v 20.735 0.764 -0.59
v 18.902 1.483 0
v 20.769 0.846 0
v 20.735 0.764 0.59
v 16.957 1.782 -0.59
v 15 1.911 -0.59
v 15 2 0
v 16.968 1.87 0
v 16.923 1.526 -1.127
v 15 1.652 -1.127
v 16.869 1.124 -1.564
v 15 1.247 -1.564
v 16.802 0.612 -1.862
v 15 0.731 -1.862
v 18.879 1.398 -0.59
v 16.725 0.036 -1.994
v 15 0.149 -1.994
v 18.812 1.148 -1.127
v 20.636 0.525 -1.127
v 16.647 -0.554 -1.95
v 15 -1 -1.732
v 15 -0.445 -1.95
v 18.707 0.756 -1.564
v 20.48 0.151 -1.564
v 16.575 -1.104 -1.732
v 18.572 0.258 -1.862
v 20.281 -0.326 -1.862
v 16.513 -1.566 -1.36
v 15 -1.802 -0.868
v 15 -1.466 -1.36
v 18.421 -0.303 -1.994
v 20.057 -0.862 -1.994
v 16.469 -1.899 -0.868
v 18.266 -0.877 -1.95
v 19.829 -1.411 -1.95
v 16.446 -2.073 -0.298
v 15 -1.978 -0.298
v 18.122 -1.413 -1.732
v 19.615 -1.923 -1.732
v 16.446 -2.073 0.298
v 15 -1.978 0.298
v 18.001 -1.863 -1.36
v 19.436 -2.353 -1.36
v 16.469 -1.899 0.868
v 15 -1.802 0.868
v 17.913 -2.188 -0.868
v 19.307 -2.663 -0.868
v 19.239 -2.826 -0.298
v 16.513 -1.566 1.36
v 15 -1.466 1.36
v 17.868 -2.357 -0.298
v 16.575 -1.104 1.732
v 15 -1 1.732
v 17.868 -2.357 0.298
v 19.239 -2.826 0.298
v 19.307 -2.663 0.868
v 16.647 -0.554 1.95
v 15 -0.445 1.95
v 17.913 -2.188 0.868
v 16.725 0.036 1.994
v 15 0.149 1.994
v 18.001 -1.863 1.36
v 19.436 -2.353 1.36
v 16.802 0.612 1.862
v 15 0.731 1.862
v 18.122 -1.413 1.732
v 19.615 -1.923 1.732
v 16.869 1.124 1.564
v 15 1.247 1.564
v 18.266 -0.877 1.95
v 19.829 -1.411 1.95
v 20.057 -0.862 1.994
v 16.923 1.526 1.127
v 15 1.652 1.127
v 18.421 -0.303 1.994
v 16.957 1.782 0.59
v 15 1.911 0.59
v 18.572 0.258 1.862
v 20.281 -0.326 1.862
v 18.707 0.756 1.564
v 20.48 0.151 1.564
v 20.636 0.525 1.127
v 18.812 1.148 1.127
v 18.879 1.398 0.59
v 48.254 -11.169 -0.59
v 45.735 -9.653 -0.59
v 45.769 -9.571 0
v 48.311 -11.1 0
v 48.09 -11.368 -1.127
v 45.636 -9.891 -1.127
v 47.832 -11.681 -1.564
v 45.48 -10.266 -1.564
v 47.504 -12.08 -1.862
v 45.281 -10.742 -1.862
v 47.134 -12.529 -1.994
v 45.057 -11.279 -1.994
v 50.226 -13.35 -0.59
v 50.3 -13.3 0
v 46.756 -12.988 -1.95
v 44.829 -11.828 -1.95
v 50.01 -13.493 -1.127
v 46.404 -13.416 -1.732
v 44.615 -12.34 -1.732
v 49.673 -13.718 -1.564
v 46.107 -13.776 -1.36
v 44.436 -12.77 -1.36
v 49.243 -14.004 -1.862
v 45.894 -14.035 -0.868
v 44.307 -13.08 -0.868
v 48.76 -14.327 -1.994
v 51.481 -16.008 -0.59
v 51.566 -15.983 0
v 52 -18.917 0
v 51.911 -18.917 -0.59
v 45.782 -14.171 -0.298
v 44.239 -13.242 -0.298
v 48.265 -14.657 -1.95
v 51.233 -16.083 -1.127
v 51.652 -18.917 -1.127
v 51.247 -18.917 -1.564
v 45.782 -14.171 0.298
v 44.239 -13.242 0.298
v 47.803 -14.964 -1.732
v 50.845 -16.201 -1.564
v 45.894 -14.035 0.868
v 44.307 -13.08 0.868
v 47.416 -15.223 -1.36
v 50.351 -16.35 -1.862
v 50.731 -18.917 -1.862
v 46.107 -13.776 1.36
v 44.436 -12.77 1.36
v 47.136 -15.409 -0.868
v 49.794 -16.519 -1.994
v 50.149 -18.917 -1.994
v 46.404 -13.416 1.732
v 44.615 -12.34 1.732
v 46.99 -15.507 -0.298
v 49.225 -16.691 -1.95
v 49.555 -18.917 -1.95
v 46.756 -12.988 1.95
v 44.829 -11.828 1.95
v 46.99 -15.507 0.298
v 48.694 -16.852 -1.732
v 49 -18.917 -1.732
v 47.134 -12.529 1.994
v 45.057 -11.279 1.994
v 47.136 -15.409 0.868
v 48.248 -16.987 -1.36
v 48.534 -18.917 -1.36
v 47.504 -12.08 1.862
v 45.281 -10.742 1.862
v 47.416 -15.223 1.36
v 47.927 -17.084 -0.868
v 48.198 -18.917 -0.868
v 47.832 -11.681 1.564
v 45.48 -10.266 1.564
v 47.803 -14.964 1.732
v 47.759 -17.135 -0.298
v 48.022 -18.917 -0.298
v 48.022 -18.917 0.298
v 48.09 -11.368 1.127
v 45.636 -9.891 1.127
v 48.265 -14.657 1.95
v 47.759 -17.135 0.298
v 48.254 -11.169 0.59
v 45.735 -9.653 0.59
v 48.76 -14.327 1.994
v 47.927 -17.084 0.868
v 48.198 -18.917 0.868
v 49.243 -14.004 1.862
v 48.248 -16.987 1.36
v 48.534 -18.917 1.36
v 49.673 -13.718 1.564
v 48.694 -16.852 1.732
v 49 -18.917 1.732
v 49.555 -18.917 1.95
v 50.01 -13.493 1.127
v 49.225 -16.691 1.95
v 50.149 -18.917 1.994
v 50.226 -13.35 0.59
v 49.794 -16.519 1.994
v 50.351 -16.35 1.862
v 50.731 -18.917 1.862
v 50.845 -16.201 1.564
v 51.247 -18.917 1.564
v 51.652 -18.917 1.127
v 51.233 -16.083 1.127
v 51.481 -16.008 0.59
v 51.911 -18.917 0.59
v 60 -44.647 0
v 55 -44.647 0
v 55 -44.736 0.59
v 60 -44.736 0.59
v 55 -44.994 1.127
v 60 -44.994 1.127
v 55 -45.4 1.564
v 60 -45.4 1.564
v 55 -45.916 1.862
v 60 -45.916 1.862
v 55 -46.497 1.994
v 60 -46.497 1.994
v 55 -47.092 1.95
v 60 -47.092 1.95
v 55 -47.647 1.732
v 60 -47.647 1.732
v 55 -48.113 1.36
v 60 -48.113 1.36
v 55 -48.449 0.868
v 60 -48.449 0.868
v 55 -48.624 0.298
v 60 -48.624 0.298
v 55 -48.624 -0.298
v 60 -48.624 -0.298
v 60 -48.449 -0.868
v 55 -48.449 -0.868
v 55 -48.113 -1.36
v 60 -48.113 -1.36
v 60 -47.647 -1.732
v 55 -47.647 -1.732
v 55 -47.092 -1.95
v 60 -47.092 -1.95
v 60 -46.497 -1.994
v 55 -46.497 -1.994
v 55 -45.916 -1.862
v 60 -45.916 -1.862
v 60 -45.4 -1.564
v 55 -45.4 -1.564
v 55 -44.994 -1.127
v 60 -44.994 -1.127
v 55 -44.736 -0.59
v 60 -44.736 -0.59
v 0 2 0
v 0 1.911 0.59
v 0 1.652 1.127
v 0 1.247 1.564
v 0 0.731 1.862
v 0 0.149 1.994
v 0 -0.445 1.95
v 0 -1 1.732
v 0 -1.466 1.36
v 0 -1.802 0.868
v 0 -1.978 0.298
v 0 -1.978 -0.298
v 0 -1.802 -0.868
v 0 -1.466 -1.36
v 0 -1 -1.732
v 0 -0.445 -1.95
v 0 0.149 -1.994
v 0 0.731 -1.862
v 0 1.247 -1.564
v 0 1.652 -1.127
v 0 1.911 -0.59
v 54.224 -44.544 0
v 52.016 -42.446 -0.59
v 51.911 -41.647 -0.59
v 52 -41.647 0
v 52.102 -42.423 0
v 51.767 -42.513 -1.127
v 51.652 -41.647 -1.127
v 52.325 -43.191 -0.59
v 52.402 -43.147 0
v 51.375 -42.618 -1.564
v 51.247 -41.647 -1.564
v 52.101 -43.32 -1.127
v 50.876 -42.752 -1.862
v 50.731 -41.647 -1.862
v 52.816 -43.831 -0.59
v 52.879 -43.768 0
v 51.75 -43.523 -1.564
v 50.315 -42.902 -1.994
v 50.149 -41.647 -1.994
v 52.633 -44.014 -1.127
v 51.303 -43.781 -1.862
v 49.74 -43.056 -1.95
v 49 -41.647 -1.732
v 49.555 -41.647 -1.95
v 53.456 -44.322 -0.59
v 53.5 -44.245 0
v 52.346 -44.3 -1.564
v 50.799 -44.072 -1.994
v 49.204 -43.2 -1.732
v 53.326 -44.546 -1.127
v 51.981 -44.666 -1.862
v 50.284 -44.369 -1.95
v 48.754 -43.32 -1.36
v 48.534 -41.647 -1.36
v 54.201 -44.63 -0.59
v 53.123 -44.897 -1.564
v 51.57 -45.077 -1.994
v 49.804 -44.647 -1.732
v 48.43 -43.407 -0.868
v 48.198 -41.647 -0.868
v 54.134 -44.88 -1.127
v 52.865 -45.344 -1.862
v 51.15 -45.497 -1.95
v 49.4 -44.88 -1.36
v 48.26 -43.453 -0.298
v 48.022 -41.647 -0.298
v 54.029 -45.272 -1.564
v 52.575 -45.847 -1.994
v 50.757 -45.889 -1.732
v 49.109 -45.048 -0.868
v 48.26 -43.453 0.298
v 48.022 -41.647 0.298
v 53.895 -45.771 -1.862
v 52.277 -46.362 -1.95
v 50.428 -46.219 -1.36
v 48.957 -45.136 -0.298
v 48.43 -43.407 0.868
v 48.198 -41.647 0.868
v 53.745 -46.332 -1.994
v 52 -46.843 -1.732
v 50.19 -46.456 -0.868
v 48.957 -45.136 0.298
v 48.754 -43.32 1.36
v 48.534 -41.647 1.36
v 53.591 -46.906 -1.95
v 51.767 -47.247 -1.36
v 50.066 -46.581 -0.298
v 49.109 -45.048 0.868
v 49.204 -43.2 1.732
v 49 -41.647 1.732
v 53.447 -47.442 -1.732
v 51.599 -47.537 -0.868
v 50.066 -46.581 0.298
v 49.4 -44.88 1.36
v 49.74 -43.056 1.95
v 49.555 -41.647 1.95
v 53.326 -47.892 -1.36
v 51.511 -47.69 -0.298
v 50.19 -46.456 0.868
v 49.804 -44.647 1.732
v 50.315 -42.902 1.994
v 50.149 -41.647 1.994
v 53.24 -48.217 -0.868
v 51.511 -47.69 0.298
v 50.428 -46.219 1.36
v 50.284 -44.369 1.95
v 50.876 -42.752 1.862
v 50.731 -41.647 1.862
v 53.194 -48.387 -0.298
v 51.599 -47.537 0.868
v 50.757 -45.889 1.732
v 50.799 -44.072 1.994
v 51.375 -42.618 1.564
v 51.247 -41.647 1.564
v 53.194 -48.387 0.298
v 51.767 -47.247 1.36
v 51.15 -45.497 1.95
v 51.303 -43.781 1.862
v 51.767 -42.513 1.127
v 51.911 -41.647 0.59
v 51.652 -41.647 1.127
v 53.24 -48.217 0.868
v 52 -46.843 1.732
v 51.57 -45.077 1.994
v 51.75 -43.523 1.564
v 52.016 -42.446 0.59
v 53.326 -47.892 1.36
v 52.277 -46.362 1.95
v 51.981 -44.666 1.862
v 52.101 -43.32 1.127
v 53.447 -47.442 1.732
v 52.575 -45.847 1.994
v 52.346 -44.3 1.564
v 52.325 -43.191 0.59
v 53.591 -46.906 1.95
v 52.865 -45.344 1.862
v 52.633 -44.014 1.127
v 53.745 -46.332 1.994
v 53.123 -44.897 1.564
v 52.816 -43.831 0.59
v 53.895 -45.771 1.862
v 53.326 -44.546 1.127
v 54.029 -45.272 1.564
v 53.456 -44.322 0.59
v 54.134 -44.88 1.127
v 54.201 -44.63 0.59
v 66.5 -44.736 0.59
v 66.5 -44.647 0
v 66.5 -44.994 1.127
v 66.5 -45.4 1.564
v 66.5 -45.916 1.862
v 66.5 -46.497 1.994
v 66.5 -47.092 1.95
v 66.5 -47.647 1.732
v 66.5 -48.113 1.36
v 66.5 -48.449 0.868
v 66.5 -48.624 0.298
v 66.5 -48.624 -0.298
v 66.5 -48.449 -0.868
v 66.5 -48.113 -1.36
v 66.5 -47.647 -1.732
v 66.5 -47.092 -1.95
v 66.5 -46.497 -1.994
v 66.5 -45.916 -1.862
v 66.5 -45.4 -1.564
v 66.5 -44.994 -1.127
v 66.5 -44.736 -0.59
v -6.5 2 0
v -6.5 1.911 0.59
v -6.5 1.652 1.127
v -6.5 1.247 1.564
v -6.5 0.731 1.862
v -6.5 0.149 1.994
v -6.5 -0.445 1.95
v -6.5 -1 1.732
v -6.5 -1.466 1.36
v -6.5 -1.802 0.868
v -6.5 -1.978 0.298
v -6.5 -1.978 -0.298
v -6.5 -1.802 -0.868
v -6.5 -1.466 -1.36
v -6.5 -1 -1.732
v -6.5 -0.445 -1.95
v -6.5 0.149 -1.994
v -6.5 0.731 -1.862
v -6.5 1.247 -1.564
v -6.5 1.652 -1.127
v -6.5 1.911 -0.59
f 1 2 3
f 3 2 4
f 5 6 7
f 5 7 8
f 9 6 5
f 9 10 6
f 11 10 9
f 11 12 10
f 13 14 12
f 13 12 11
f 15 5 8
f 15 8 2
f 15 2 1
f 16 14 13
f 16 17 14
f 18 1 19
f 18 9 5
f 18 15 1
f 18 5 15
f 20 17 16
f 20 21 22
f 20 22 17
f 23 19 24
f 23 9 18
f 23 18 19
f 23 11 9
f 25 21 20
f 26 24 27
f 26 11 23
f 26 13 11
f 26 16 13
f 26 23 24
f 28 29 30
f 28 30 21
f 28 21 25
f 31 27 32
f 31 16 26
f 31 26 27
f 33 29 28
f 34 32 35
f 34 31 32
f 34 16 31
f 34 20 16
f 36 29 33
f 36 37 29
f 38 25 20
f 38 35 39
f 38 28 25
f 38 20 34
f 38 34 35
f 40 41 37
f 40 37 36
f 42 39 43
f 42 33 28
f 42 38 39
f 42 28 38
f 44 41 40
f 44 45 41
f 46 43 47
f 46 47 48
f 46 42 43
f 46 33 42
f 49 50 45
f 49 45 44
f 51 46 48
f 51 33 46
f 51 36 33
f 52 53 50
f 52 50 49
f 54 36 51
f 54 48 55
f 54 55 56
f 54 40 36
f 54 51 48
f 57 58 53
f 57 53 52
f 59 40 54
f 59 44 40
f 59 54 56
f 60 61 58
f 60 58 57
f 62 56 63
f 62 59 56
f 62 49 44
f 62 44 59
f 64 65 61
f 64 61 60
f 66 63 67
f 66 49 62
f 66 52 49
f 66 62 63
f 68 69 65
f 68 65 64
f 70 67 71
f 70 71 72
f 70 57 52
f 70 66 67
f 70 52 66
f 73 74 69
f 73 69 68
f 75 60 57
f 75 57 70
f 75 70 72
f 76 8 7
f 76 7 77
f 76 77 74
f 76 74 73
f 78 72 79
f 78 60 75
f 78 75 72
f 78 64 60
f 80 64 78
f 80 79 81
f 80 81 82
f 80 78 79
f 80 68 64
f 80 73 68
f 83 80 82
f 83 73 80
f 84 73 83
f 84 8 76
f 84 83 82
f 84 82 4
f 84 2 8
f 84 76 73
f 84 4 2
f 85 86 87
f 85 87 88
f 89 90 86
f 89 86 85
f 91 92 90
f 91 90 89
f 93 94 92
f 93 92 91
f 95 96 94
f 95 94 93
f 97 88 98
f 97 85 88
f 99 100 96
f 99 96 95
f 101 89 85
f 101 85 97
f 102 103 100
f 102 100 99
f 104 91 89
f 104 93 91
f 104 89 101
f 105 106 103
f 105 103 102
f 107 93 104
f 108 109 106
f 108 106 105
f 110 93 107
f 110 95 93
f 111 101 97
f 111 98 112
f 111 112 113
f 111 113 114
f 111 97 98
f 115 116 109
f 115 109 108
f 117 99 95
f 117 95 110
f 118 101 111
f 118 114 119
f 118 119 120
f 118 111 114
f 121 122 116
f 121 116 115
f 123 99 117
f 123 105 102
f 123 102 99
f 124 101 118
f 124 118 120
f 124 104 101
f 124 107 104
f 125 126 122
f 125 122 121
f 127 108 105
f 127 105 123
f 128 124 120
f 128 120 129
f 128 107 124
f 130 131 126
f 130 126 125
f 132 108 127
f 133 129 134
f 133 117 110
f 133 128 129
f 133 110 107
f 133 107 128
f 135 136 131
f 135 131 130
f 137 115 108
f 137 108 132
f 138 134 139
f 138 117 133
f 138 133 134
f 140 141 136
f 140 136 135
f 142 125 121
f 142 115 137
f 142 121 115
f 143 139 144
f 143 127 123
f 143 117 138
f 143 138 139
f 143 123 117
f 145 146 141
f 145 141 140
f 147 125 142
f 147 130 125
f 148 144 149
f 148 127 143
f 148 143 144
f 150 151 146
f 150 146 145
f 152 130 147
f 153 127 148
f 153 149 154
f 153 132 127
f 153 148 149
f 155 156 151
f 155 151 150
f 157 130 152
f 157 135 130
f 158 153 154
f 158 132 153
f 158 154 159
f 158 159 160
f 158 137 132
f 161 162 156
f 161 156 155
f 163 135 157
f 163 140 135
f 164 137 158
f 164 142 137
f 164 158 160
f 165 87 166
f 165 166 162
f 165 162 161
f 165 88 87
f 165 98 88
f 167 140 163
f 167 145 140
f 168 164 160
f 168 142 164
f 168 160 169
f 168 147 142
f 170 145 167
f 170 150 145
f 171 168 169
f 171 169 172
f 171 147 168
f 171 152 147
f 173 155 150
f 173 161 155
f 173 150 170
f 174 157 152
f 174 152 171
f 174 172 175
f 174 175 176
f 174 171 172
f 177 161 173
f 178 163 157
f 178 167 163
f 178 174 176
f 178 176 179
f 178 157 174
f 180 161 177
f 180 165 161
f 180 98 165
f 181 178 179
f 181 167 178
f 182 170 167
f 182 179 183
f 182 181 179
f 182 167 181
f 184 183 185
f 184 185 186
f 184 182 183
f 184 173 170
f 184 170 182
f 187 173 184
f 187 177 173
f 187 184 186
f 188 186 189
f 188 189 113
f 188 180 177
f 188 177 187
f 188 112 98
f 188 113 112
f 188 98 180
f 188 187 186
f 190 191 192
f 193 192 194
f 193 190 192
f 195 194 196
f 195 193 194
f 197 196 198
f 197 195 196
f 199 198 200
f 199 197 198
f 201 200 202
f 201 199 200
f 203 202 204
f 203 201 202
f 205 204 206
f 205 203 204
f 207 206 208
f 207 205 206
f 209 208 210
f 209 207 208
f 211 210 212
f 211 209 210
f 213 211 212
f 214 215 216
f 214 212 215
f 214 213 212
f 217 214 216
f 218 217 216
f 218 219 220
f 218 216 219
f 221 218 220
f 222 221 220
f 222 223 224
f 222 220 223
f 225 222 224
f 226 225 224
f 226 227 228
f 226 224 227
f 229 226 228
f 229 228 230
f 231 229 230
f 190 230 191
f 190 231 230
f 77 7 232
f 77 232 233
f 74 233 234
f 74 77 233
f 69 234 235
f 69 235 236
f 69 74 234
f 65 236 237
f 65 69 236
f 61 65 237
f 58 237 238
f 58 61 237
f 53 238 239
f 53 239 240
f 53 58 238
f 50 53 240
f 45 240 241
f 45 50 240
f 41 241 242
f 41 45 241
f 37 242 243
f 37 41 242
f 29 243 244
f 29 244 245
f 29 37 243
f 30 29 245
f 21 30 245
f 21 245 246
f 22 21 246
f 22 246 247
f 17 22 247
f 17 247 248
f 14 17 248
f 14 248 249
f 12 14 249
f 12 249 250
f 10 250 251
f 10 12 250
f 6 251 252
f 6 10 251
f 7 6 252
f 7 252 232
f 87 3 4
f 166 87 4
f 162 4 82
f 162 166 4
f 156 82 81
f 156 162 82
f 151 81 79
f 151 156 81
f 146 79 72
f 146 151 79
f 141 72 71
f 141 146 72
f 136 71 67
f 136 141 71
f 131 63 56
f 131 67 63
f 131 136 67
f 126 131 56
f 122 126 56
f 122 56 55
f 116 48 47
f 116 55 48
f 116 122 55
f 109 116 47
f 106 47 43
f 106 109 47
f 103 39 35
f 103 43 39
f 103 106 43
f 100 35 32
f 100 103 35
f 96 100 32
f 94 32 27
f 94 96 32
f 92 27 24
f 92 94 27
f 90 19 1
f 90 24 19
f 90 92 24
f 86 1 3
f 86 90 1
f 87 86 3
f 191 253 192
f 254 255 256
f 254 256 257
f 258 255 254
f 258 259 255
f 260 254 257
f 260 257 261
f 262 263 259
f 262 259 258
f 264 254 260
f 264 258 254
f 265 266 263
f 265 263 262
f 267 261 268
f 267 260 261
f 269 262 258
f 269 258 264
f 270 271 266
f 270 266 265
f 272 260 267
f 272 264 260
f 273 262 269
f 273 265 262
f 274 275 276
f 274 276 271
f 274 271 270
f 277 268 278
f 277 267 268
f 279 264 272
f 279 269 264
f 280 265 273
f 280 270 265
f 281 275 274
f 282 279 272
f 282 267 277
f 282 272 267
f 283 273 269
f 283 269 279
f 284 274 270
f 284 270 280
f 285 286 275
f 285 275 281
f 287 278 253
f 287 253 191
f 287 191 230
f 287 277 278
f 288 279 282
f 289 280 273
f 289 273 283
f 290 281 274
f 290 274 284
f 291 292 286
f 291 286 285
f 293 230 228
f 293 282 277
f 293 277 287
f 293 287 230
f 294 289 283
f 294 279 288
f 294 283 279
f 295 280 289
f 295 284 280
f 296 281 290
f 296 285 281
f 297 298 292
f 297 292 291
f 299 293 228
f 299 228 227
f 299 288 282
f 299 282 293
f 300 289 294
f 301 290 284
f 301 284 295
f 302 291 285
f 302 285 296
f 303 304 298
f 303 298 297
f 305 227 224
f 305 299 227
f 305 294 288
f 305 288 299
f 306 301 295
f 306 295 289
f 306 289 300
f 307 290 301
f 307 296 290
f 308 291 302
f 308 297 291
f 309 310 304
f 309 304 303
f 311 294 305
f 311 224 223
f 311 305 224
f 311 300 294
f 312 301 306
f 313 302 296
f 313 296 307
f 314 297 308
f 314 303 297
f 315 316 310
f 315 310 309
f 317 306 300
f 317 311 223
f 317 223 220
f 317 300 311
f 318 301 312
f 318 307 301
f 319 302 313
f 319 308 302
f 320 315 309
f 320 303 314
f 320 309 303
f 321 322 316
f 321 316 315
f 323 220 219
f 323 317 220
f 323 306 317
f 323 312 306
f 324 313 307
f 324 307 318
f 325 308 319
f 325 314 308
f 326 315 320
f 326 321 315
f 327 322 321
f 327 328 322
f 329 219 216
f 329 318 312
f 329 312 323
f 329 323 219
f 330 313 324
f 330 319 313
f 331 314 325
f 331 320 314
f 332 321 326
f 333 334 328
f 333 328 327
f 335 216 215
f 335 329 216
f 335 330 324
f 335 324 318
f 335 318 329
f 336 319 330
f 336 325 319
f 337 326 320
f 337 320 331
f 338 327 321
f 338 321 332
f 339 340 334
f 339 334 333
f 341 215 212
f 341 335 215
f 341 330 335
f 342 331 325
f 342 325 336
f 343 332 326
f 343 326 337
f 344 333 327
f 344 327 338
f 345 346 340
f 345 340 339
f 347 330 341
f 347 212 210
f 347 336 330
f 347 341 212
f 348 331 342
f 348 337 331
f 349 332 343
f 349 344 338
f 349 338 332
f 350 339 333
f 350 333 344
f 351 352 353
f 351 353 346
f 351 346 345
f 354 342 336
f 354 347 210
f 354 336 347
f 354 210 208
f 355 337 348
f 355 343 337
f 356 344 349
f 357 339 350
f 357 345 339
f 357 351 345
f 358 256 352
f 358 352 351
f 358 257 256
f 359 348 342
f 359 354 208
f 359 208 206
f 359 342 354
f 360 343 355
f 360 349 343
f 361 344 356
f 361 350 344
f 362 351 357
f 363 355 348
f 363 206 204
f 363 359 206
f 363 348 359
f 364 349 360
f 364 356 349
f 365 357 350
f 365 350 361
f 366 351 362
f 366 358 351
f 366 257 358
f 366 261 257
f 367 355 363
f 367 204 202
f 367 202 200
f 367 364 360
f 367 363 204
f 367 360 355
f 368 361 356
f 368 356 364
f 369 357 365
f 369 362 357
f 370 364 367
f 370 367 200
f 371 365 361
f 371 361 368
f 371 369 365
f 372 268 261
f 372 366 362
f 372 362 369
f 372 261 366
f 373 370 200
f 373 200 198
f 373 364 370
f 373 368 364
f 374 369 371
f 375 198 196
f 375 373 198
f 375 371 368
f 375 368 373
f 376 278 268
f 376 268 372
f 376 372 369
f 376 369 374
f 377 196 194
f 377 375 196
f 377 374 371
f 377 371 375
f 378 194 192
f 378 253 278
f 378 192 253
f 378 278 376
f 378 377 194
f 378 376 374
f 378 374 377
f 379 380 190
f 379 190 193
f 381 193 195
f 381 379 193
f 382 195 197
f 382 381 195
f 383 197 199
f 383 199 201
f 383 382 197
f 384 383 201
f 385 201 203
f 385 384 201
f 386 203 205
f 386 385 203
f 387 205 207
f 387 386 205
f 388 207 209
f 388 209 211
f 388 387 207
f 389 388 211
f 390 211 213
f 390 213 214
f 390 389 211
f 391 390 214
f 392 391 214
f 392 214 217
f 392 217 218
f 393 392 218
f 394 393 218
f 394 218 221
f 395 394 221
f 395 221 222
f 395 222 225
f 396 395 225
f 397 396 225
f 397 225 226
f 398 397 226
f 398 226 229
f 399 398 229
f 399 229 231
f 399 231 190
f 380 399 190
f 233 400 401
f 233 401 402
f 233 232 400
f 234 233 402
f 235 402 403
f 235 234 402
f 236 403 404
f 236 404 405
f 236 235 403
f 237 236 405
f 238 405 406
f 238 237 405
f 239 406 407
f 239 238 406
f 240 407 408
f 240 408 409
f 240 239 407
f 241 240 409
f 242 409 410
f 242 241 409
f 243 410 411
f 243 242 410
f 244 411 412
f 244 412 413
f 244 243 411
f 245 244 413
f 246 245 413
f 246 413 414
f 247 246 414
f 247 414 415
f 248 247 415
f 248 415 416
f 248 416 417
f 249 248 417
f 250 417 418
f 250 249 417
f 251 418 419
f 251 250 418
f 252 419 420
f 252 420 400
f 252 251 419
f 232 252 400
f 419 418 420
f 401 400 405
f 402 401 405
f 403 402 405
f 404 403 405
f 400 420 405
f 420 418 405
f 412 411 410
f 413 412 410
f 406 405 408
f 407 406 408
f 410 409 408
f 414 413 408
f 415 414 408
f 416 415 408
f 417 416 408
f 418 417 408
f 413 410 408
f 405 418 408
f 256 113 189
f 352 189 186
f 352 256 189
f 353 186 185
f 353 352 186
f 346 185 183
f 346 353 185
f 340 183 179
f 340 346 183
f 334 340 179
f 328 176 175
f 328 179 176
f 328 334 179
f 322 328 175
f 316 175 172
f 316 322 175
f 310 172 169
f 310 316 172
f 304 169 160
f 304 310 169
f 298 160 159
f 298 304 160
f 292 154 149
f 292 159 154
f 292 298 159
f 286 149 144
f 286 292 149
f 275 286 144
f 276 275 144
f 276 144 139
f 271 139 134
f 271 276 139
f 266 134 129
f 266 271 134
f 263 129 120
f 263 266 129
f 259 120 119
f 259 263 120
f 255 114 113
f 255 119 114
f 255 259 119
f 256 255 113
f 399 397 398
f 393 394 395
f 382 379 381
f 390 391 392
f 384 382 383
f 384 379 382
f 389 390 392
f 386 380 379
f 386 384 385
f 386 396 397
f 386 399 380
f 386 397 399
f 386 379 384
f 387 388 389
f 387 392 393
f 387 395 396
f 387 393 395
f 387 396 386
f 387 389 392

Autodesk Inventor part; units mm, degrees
ref_plane "YZ Plane" through (0, 0, 0) normal (1, 0, 0) x (0, 1, 0)
ref_plane "XZ Plane" through (0, 0, 0) normal (0, 1, 0) x (-1, 0, 0)
ref_plane "XY Plane" through (0, 0, 0) normal (0, 0, 1) x (1, 0, 0)
sketch "Skizze1" plane through (0, 0, 0) normal (0, 0, 1) x (1, 0, 0)
  line L0 (0, 0) -> (15, 0)
  arc A0 (20, -1) -> (15, 0) centre (15, -13) ccw
  line L1 (20, -1) -> (45, -11.4167)
  arc A1 (50, -18.9167) -> (45, -11.4167) centre (41.875, -18.9167) ccw
  line L2 (50, -18.9167) -> (50, -41.6467)
  arc A2 (50, -41.6467) -> (55, -46.6467) centre (55, -41.6467) ccw
  line L3 (55, -46.6467) -> (60, -46.6467)
  line L4 (60, -46.6467) -> (66.5, -46.6467)
  line L5 (0, 0) -> (-6.5, 0)
  point P0 (57.5, -46.6467)
  dimension "d0" = 15
  dimension "d1" = 20
  dimension "d2" = 1
  dimension "d3" = 45
  dimension "d4" = 5
  dimension "d5" = 22.73
  dimension "d6" = 5
  dimension "d7" = 5
  dimension "d20" = 46.6467
  dimension "d22" = 6.5
  dimension "d23" = 6.5
sketch "Skizze2" plane through (0, 0, 0) normal (1, 0, 0) x (0, 1, 0)
  circle A0 centre (0, 0) radius 2
  dimension "d16" = 4
sweep "Sweeping1" add profiles "Skizze2" path "Skizze1"
equation "\"d22\" = d23"
properties part number "front iron bar"
